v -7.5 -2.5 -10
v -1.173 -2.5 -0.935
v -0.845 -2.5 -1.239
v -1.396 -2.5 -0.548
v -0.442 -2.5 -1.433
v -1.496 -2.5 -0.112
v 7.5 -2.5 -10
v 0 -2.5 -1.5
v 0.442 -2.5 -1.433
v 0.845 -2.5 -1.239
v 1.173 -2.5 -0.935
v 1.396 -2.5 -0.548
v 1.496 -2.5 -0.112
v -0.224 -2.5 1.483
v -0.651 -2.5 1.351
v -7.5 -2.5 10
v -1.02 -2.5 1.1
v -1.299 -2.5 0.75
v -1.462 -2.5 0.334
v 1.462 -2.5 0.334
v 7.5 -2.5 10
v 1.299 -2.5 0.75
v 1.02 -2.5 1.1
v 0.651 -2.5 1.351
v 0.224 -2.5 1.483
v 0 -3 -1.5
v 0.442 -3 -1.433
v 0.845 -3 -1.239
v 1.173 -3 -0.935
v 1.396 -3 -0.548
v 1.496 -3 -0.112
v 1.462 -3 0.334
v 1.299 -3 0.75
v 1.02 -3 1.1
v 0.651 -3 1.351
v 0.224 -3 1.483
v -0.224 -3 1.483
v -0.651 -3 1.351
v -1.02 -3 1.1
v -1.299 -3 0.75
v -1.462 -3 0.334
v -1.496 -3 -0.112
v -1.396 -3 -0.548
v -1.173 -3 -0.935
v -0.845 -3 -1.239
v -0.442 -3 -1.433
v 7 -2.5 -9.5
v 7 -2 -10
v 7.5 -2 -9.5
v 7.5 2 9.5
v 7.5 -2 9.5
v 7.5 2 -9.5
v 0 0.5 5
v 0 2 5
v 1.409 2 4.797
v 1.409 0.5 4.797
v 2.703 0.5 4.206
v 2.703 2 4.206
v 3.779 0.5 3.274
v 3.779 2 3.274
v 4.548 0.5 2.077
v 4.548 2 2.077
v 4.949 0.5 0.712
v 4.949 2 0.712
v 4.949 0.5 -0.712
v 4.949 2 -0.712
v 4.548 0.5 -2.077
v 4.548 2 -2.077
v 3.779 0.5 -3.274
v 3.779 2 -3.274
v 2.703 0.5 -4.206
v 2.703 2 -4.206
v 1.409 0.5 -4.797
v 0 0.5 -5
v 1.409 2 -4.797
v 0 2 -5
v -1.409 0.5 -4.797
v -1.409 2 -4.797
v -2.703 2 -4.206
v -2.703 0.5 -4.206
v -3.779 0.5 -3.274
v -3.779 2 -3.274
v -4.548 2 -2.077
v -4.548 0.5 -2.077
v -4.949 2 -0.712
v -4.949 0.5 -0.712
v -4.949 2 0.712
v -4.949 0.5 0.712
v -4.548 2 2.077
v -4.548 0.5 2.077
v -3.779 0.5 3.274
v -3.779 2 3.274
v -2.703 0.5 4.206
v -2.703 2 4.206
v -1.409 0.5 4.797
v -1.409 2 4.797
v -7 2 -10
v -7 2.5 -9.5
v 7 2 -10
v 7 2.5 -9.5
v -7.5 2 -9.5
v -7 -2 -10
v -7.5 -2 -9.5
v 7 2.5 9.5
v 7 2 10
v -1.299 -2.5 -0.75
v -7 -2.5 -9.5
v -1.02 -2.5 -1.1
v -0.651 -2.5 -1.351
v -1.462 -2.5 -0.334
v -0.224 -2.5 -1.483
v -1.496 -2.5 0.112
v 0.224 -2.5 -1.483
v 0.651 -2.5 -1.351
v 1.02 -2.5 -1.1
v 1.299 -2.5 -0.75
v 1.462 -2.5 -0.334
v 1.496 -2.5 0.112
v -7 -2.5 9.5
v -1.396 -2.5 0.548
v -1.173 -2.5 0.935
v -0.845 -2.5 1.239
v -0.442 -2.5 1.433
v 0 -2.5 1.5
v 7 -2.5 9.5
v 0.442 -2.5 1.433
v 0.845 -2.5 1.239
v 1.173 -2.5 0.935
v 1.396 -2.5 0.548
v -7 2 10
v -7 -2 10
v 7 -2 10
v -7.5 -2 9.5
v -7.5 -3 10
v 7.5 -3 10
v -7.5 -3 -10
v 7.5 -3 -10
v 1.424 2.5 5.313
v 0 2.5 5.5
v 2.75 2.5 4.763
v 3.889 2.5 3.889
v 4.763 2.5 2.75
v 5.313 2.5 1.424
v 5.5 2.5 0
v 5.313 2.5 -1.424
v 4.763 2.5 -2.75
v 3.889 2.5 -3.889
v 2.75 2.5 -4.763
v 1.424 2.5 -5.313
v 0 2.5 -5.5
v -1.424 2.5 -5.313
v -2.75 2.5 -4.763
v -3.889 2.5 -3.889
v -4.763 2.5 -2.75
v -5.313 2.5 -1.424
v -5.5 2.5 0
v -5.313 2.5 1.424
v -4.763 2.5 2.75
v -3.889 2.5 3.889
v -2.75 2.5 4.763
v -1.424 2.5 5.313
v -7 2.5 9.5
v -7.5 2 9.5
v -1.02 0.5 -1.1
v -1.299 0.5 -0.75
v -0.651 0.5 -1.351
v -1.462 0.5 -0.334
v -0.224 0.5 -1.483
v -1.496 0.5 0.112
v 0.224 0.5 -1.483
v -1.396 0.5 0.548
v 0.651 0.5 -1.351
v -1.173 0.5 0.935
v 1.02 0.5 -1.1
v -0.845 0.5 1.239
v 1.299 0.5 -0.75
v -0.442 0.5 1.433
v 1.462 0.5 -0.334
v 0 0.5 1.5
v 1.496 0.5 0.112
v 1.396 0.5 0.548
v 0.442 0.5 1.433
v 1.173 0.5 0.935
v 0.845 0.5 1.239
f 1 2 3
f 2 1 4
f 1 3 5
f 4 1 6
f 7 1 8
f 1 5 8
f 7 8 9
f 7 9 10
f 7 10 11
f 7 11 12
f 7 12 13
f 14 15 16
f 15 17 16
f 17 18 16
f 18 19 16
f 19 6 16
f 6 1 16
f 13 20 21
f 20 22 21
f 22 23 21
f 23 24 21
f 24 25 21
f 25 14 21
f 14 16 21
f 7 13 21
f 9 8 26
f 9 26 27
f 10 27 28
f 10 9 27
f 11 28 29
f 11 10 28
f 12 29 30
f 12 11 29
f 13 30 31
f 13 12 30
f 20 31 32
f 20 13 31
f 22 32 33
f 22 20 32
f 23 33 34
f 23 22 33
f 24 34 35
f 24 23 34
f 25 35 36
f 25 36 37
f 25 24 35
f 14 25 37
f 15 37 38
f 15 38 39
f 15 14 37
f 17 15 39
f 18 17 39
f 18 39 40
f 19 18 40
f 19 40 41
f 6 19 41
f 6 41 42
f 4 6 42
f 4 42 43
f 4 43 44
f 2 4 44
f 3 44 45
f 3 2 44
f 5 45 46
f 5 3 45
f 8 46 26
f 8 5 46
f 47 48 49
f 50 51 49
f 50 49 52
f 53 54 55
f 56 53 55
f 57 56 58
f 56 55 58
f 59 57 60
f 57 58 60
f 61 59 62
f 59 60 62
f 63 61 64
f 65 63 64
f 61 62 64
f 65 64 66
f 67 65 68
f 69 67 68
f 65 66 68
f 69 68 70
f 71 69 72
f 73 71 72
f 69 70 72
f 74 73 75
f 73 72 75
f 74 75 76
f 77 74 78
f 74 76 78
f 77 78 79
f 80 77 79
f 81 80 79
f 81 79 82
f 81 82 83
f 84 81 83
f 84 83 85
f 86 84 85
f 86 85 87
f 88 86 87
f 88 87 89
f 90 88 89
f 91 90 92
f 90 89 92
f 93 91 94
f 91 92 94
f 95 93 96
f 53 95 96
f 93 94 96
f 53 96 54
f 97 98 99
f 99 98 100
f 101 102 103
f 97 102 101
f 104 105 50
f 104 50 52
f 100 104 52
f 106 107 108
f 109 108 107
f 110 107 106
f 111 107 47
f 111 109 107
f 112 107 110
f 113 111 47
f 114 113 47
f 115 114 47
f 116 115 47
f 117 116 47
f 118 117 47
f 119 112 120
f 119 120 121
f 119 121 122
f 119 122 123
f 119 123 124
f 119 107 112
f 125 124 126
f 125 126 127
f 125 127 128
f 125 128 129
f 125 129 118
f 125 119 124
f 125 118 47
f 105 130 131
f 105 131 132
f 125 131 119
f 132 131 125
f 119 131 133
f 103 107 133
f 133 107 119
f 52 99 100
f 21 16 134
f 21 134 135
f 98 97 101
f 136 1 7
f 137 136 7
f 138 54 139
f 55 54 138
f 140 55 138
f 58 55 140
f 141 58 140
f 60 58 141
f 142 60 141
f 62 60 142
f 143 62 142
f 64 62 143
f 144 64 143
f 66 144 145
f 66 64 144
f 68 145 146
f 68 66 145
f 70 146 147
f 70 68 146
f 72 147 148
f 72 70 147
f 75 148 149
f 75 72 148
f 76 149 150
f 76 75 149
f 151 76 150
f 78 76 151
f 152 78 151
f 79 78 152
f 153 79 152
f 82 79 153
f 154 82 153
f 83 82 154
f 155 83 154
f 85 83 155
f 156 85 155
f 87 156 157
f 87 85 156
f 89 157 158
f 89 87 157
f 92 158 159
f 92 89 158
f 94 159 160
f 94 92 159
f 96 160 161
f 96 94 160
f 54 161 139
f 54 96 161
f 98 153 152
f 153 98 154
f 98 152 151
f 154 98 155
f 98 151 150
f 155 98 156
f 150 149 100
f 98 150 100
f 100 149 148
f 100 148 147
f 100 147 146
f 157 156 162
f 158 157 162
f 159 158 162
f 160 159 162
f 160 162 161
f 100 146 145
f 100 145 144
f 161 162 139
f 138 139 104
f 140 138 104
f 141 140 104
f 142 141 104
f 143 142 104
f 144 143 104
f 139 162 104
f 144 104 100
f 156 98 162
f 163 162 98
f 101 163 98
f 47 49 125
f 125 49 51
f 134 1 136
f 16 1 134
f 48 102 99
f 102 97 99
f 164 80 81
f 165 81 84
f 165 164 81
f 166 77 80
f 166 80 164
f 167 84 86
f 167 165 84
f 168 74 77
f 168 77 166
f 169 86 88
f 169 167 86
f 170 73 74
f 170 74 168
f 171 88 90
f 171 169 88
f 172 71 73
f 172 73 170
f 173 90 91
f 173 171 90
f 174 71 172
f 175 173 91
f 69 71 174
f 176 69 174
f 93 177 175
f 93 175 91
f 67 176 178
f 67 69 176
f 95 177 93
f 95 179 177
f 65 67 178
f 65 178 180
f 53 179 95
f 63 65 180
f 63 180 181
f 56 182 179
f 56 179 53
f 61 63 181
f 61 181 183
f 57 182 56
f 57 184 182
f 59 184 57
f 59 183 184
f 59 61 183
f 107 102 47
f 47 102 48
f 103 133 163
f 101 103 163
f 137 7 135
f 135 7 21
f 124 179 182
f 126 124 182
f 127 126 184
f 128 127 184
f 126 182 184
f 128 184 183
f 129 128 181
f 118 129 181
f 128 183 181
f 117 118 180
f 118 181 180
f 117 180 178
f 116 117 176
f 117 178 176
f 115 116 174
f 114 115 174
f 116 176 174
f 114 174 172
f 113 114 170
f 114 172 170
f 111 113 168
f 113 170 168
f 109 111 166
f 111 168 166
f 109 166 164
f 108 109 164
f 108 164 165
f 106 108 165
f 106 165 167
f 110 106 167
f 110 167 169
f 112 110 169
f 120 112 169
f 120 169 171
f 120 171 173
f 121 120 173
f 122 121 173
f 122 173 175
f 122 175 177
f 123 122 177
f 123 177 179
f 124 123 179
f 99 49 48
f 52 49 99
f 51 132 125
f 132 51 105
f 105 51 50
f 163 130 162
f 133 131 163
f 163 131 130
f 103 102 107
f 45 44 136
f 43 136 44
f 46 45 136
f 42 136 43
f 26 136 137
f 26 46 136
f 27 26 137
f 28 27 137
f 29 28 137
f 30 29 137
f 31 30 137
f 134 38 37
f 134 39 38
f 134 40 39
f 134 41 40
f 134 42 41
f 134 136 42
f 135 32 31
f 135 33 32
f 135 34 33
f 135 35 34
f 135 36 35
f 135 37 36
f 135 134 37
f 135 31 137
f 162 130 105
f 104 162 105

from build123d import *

# Parameters (mm, degrees)
CROQUIS1_W              = 15
CROQUIS1_H              = 5
SALIENTE_EXTRUIR1_DEPTH = 10
CROQUIS2_R              = 1.5
CORTAR_EXTRUIR1_DEPTH   = 14.462912018
CROQUIS7_R              = 5
CORTAR_EXTRUIR3_DEPTH   = 2
CROQUIS3_R              = 4
SALIENTE_EXTRUIR2_DEPTH = 3
CROQUIS4_R              = 4
SALIENTE_EXTRUIR3_DEPTH = 6
SALIENTE_EXTRUIR3_TAPER = 33
SALIENTE_EXTRUIR4_REACH = 19.328
CROQUIS5_R              = 0.103554441
CROQUIS6_R              = 2
CORTAR_EXTRUIR2_DEPTH   = 2
CROQUIS9_W              = 15
CROQUIS9_H              = 20
CROQUIS9_R              = 1.5
SALIENTE_EXTRUIR5_DEPTH = 0.5
CHAFL_N1_SIZE           = 0.5


with BuildPart() as part:
    # Croquis1 → Saliente-Extruir1 (new, symmetric)
    with BuildSketch(Plane.XY):
        Rectangle(CROQUIS1_W, CROQUIS1_H)
    extrude(amount=SALIENTE_EXTRUIR1_DEPTH, both=True)

    # Croquis2 → Cortar-Extruir1 (cut, through all)
    with BuildSketch(Plane(origin=(0, 2.5, 0), x_dir=(1, 0, 0), z_dir=(0, 1, 0))):
        with Locations(Location((0, 0, 0), (0, 0, 270))):
            Circle(CROQUIS2_R)
    extrude(amount=-CORTAR_EXTRUIR1_DEPTH, mode=Mode.SUBTRACT)

    # Croquis7 → Cortar-Extruir3 (cut)
    with BuildSketch(Plane(origin=(0, 2.5, 0), x_dir=(1, 0, 0), z_dir=(0, 1, 0))):
        with Locations(Location((0, 0, 0), (0, 0, 270))):
            Circle(CROQUIS7_R)
    extrude(amount=-CORTAR_EXTRUIR3_DEPTH, mode=Mode.SUBTRACT)

    # Chaflán1
    chafl_n1_edges = [part.edges().sort_by_distance(p)[0] for p in [
        (-7.5, 0, 10),
        (0, -2.5, 10),
        (0, 2.5, -5),
        (7.5, 0, 10),
        (0, -2.5, -10),
        (-7.5, 0, -10),
        (0, 2.5, -10),
        (7.5, 0, -10),
        (0, 2.5, 10),
        (7.5, -2.5, 0),
        (-7.5, -2.5, 0),
        (-7.5, 2.5, 0),
        (7.5, 2.5, 0),
    ]]
    chamfer(chafl_n1_edges, length=CHAFL_N1_SIZE)


with BuildPart() as body_2:
    # Croquis3 → Saliente-Extruir2 (new body)
    with BuildSketch(Plane(origin=(0, 0.5, 0), x_dir=(1, 0, 0), z_dir=(0, 1, 0))):
        with Locations(Location((0, 0, 0), (0, 0, 270))):
            Circle(CROQUIS3_R)
        Polygon((-1.732050808, -3), (1.732050808, -3), (3.464101615, 0), (1.732050808, 3), (-1.732050808, 3), (-3.464101615, 0), align=None, mode=Mode.SUBTRACT)
    extrude(amount=SALIENTE_EXTRUIR2_DEPTH)

    # Croquis4 → Saliente-Extruir3 (add)
    with BuildSketch(Plane(origin=(0, 3.5, 0), x_dir=(1, 0, 0), z_dir=(0, 1, 0))):
        with Locations(Location((0, 0, 0), (0, 0, 270))):
            Circle(CROQUIS4_R)
    extrude(amount=SALIENTE_EXTRUIR3_DEPTH, taper=SALIENTE_EXTRUIR3_TAPER)

    # Saliente-Extruir4: up to this cone (the profile starts outside it)
    saliente_extruir4_end = Plane(origin=(0, 9.5, 0), z_dir=(0, -1, 0)).offset(-0.159458855) * Cone(1e-06, 13.047257239, 20.091013296, align=(Align.CENTER, Align.CENTER, Align.MIN), mode=Mode.PRIVATE)
    # Croquis5 → Saliente-Extruir4 (add, up to the surface)
    with BuildSketch(Plane(origin=(0, 9.5, 0), x_dir=(1, 0, 0), z_dir=(0, 1, 0)), mode=Mode.PRIVATE) as saliente_extruir4_sk1:
        with BuildLine():
            Line((-1.648700226, 2.200974231), (-0.805838424, 1.553423456))
            Line((-0.805838424, 1.553423456), (-0.849796735, 2.61540542))
            ThreePointArc((-0.849796735, 2.61540542), (-0.731113465, 2.651032459), (-0.610945733, 2.681276806))
            Line((-0.610945733, 2.681276806), (-0.10433579, 1.746886958))
            Line((-0.10433579, 1.746886958), (0.287453274, 2.734935212))
            ThreePointArc((0.287453274, 2.734935212), (0.410366658, 2.719209298), (0.532446828, 2.697962263))
            Line((0.532446828, 2.697962263), (0.61520745, 1.638297834))
            Line((0.61520745, 1.638297834), (1.375, 2.38156986))
            ThreePointArc((1.375, 2.38156986), (1.480890658, 2.317210146), (1.583774496, 2.248145535))
            Line((1.583774496, 2.248145535), (1.228375733, 1.246432131))
            Line((1.228375733, 1.246432131), (2.224796735, 1.616409444))
            ThreePointArc((2.224796735, 1.616409444), (2.29535521, 1.514544308), (2.361253164, 1.40960402))
            Line((2.361253164, 1.40960402), (1.629146692, 0.63904699))
            Line((1.629146692, 0.63904699), (2.689905902, 0.57175715))
            ThreePointArc((2.689905902, 0.57175715), (2.712931993, 0.45), (2.73044971, 0.327329164))
            Line((2.73044971, 0.327329164), (1.748223388, -0.078835182))
            Line((1.748223388, -0.078835182), (2.689905902, -0.57175715))
            ThreePointArc((2.689905902, -0.57175715), (2.661418189, -0.692353396), (2.627526695, -0.811543878))
            Line((2.627526695, -0.811543878), (1.565016378, -0.783086035))
            Line((1.565016378, -0.783086035), (2.224796735, -1.616409444))
            ThreePointArc((2.224796735, -1.616409444), (2.149721001, -1.7149926), (2.070280445, -1.810093611))
            Line((2.070280445, -1.810093611), (1.111203818, -1.351934198))
            Line((1.111203818, -1.351934198), (1.375, -2.38156986))
            ThreePointArc((1.375, -2.38156986), (1.266317523, -2.441094003), (1.155063897, -2.495661715))
            Line((1.155063897, -2.495661715), (0.465254023, -1.687020656))
            Line((0.465254023, -1.687020656), (0.287453274, -2.734935212))
            ThreePointArc((0.287453274, -2.734935212), (0.163956241, -2.745108076), (0.040126308, -2.749707235))
            Line((0.040126308, -2.749707235), (-0.261142419, -1.730405917))
            Line((-0.261142419, -1.730405917), (-0.849796735, -2.61540542))
            ThreePointArc((-0.849796735, -2.61540542), (-0.966754565, -2.574468025), (-1.081749483, -2.528303395))
            Line((-1.081749483, -2.528303395), (-0.942384964, -1.474588274))
            Line((-0.942384964, -1.474588274), (-1.840109167, -2.04364827))
            ThreePointArc((-1.840109167, -2.04364827), (-1.930304724, -1.958679064), (-2.016580962, -1.869732928))
            Line((-2.016580962, -1.869732928), (-1.460680588, -0.963800923))
            Line((-1.460680588, -0.963800923), (-2.512250009, -1.118525768))
            ThreePointArc((-2.512250009, -1.118525768), (-2.560087659, -1.004216698), (-2.602727273, -0.887868652))
            Line((-2.602727273, -0.887868652), (-1.726411268, -0.286363636))
            Line((-1.726411268, -0.286363636), (-2.75, 0))
            ThreePointArc((-2.75, 0), (-2.747208181, 0.123883857), (-2.738838393, 0.247516179))
            Line((-2.738838393, 0.247516179), (-1.693629756, 0.440588525))
            Line((-1.693629756, 0.440588525), (-2.512250009, 1.118525768))
            ThreePointArc((-2.512250009, 1.118525768), (-2.459311451, 1.230563769), (-2.401379473, 1.340103215))
            Line((-2.401379473, 1.340103215), (-1.368004273, 1.091358927))
            Line((-1.368004273, 1.091358927), (-1.840109167, 2.04364827))
            ThreePointArc((-1.840109167, 2.04364827), (-1.746177428, 2.124468025), (-1.648700226, 2.200974231))
        make_face()
        Circle(CROQUIS5_R, mode=Mode.SUBTRACT)
    saliente_extruir4_tool1 = extrude(saliente_extruir4_sk1.sketch, amount=-SALIENTE_EXTRUIR4_REACH, mode=Mode.PRIVATE) - saliente_extruir4_end
    add(saliente_extruir4_tool1.solids().sort_by_distance((-1.902837, 9.5, -1.140349))[0])

    # Croquis6 → Cortar-Extruir2 (cut)
    with BuildSketch(Plane.XZ.offset(-3.5)):
        with Locations(Location((0, 0, 0), (0, 0, 270))):
            Circle(CROQUIS6_R)
    extrude(amount=-CORTAR_EXTRUIR2_DEPTH, mode=Mode.SUBTRACT)


with BuildPart() as body_2_2:
    # Croquis9 → Saliente-Extruir5 (new body)
    with BuildSketch(Plane.XZ.offset(2.5)):
        Rectangle(CROQUIS9_W, CROQUIS9_H)
        with Locations(Location((0, 0, 0), (0, 0, 270))):
            Circle(CROQUIS9_R, mode=Mode.SUBTRACT)
    extrude(amount=SALIENTE_EXTRUIR5_DEPTH)


solid = Compound([part.part, body_2_2.part])
